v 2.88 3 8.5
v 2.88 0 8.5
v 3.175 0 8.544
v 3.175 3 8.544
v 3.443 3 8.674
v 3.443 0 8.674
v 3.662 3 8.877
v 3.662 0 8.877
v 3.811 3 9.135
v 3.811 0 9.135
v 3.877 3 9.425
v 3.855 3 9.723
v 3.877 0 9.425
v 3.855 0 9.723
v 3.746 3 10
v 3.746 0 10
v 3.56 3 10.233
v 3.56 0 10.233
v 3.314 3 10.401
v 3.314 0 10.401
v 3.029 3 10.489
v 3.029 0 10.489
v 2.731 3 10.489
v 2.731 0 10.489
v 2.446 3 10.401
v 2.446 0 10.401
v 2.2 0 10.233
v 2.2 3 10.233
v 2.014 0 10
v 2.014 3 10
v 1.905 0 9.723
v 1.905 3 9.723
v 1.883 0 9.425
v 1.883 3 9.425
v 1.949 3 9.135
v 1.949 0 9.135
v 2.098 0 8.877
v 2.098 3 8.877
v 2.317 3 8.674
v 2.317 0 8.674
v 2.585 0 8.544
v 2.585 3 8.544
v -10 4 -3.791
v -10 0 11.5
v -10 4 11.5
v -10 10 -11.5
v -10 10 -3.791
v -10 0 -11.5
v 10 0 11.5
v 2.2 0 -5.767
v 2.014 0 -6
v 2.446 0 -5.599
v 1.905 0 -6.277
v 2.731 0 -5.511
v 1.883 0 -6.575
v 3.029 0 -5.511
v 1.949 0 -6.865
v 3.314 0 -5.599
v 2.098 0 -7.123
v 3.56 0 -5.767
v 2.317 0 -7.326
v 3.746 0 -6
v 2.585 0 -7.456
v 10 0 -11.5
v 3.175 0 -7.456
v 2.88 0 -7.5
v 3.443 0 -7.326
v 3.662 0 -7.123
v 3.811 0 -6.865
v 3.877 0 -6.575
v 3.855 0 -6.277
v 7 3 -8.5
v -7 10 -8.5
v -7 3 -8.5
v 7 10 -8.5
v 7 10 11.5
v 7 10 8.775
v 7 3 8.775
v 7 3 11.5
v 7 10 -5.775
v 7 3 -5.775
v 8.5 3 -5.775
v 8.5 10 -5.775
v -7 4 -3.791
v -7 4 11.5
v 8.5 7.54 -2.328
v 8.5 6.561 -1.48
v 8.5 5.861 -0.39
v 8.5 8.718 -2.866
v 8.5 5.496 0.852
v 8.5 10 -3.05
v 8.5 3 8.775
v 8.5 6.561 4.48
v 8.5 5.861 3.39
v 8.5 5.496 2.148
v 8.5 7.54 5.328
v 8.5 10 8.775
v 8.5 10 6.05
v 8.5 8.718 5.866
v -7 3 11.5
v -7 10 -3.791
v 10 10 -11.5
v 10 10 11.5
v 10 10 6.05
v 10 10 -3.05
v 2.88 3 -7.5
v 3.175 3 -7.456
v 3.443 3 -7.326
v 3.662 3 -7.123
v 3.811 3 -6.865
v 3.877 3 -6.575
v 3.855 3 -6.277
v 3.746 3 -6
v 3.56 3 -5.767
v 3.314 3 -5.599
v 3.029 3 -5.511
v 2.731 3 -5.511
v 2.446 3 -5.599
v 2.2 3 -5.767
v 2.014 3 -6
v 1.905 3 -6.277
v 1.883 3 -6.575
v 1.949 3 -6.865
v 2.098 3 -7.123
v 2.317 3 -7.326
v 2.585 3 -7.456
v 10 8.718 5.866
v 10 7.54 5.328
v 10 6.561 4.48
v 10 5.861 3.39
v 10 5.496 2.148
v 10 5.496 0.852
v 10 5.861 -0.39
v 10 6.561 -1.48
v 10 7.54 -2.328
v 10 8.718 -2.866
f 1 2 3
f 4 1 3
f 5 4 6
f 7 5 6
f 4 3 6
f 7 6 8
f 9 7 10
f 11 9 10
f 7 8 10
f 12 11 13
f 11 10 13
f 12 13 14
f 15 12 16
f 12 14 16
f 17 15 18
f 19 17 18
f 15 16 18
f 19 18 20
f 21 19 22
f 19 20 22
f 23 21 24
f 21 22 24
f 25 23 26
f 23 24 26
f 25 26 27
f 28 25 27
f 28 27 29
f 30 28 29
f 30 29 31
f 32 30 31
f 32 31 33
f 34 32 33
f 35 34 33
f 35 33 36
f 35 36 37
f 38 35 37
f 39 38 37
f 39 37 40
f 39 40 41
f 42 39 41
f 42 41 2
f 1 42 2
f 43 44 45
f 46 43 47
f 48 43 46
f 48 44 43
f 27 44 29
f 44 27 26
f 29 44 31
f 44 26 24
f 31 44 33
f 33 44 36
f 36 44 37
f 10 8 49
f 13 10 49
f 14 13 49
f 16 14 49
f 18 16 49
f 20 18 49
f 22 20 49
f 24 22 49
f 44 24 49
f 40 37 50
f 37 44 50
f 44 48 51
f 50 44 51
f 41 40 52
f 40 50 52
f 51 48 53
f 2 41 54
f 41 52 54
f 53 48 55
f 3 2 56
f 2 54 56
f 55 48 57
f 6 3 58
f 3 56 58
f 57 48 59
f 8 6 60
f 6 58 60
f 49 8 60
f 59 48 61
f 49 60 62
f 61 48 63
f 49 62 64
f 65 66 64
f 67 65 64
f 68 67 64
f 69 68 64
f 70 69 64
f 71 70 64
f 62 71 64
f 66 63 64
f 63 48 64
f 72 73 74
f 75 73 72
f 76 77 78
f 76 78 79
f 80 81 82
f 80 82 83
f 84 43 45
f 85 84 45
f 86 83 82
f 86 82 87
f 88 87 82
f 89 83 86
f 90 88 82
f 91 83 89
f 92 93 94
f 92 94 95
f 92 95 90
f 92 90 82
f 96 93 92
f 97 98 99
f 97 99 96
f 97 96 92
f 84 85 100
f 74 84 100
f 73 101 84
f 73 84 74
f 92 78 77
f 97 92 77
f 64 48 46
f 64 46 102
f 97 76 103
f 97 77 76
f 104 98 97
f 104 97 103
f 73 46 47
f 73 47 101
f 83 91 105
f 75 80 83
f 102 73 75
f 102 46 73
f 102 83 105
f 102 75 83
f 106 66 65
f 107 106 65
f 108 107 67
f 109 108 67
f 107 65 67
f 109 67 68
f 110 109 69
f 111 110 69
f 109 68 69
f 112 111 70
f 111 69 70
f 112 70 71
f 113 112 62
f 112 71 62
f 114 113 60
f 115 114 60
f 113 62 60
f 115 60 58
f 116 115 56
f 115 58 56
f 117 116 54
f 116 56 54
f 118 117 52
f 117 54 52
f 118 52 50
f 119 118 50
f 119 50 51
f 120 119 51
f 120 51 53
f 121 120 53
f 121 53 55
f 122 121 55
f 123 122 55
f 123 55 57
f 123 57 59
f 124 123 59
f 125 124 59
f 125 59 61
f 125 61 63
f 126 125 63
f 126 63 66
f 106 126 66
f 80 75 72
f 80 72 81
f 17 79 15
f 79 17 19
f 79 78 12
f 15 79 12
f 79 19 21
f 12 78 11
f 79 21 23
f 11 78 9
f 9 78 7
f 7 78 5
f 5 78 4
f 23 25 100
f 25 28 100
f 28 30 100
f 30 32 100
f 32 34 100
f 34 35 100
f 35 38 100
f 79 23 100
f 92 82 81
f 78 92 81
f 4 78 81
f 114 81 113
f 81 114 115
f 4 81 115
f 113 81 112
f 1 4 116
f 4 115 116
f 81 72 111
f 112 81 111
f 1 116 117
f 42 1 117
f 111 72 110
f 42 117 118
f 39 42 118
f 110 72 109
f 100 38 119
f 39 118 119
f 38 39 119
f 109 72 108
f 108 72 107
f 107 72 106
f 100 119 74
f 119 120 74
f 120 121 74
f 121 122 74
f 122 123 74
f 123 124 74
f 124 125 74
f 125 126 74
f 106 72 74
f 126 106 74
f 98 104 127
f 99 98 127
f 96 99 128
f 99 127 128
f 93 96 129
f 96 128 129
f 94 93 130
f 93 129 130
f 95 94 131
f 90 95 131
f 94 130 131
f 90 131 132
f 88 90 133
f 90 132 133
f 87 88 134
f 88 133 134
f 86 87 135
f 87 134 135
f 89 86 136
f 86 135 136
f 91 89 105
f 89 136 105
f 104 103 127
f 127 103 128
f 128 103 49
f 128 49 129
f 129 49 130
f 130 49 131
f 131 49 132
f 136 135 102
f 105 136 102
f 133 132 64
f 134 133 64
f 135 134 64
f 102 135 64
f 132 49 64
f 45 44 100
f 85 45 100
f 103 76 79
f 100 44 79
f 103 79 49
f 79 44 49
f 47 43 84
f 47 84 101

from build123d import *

# Parameters (mm, degrees)
SKETCH1_W           = 20
SKETCH1_H           = 23
BOSS_EXTRUDE1_DEPTH = 10
CUT_EXTRUDE1_DEPTH  = 7
SKETCH4_R           = 4.55
CUT_EXTRUDE6_DEPTH  = 7
SKETCH9_W           = 14.55
SKETCH9_H           = 7
CUT_EXTRUDE8_DEPTH  = 1.5
SKETCH10_W          = 15.291428019
SKETCH10_H          = 6
CUT_EXTRUDE9_DEPTH  = 5.5
SKETCH11_R          = 1
CUT_EXTRUDE10_DEPTH = 5.5


with BuildPart() as part:
    # Sketch1 → Boss-Extrude1 (new body)
    with BuildSketch(Plane(origin=(0, 0, 0), x_dir=(1, 0, 0), z_dir=(0, 1, 0))):
        Rectangle(SKETCH1_W, SKETCH1_H)
    extrude(amount=BOSS_EXTRUDE1_DEPTH)

    # Sketch3 → Cut-Extrude1 (cut)
    with BuildSketch(Plane(origin=(0, 10, 0), x_dir=(1, 0, 0), z_dir=(0, 1, 0))):
        Polygon((0, -11.5), (-7, -11.5), (-7, 8.5), (7, 8.5), (7, -11.5), align=None)
    extrude(amount=-CUT_EXTRUDE1_DEPTH, mode=Mode.SUBTRACT)

    # Sketch4 → Cut-Extrude6 (cut)
    with BuildSketch(Plane(origin=(10, 0, 0), x_dir=(0, 0, -1), z_dir=(1, 0, 0))):
        with Locations((-1.5, 10)):
            Circle(SKETCH4_R)
    extrude(amount=-CUT_EXTRUDE6_DEPTH, mode=Mode.SUBTRACT)

    # Sketch9 → Cut-Extrude8 (cut)
    with BuildSketch(Plane.ZY.offset(-7)):
        with Locations((1.5, 6.5)):
            Rectangle(SKETCH9_W, SKETCH9_H)
    extrude(amount=-CUT_EXTRUDE8_DEPTH, mode=Mode.SUBTRACT)

    # Sketch10 → Cut-Extrude9 (cut)
    with BuildSketch(Plane.ZY.offset(10)):
        with Locations((3.854285991, 7)):
            Rectangle(SKETCH10_W, SKETCH10_H)
    extrude(amount=-CUT_EXTRUDE9_DEPTH, mode=Mode.SUBTRACT)

    # Sketch11 → Cut-Extrude10 (cut)
    with BuildSketch(Plane.XZ):
        with Locations(Location((2.88, 9.5, 0), (0, 0, 270))):
            Circle(SKETCH11_R)
        with Locations(Location((2.88, -6.5, 0), (0, 0, 270))):
            Circle(SKETCH11_R)
    extrude(amount=-CUT_EXTRUDE10_DEPTH, mode=Mode.SUBTRACT)


solid = part.part
